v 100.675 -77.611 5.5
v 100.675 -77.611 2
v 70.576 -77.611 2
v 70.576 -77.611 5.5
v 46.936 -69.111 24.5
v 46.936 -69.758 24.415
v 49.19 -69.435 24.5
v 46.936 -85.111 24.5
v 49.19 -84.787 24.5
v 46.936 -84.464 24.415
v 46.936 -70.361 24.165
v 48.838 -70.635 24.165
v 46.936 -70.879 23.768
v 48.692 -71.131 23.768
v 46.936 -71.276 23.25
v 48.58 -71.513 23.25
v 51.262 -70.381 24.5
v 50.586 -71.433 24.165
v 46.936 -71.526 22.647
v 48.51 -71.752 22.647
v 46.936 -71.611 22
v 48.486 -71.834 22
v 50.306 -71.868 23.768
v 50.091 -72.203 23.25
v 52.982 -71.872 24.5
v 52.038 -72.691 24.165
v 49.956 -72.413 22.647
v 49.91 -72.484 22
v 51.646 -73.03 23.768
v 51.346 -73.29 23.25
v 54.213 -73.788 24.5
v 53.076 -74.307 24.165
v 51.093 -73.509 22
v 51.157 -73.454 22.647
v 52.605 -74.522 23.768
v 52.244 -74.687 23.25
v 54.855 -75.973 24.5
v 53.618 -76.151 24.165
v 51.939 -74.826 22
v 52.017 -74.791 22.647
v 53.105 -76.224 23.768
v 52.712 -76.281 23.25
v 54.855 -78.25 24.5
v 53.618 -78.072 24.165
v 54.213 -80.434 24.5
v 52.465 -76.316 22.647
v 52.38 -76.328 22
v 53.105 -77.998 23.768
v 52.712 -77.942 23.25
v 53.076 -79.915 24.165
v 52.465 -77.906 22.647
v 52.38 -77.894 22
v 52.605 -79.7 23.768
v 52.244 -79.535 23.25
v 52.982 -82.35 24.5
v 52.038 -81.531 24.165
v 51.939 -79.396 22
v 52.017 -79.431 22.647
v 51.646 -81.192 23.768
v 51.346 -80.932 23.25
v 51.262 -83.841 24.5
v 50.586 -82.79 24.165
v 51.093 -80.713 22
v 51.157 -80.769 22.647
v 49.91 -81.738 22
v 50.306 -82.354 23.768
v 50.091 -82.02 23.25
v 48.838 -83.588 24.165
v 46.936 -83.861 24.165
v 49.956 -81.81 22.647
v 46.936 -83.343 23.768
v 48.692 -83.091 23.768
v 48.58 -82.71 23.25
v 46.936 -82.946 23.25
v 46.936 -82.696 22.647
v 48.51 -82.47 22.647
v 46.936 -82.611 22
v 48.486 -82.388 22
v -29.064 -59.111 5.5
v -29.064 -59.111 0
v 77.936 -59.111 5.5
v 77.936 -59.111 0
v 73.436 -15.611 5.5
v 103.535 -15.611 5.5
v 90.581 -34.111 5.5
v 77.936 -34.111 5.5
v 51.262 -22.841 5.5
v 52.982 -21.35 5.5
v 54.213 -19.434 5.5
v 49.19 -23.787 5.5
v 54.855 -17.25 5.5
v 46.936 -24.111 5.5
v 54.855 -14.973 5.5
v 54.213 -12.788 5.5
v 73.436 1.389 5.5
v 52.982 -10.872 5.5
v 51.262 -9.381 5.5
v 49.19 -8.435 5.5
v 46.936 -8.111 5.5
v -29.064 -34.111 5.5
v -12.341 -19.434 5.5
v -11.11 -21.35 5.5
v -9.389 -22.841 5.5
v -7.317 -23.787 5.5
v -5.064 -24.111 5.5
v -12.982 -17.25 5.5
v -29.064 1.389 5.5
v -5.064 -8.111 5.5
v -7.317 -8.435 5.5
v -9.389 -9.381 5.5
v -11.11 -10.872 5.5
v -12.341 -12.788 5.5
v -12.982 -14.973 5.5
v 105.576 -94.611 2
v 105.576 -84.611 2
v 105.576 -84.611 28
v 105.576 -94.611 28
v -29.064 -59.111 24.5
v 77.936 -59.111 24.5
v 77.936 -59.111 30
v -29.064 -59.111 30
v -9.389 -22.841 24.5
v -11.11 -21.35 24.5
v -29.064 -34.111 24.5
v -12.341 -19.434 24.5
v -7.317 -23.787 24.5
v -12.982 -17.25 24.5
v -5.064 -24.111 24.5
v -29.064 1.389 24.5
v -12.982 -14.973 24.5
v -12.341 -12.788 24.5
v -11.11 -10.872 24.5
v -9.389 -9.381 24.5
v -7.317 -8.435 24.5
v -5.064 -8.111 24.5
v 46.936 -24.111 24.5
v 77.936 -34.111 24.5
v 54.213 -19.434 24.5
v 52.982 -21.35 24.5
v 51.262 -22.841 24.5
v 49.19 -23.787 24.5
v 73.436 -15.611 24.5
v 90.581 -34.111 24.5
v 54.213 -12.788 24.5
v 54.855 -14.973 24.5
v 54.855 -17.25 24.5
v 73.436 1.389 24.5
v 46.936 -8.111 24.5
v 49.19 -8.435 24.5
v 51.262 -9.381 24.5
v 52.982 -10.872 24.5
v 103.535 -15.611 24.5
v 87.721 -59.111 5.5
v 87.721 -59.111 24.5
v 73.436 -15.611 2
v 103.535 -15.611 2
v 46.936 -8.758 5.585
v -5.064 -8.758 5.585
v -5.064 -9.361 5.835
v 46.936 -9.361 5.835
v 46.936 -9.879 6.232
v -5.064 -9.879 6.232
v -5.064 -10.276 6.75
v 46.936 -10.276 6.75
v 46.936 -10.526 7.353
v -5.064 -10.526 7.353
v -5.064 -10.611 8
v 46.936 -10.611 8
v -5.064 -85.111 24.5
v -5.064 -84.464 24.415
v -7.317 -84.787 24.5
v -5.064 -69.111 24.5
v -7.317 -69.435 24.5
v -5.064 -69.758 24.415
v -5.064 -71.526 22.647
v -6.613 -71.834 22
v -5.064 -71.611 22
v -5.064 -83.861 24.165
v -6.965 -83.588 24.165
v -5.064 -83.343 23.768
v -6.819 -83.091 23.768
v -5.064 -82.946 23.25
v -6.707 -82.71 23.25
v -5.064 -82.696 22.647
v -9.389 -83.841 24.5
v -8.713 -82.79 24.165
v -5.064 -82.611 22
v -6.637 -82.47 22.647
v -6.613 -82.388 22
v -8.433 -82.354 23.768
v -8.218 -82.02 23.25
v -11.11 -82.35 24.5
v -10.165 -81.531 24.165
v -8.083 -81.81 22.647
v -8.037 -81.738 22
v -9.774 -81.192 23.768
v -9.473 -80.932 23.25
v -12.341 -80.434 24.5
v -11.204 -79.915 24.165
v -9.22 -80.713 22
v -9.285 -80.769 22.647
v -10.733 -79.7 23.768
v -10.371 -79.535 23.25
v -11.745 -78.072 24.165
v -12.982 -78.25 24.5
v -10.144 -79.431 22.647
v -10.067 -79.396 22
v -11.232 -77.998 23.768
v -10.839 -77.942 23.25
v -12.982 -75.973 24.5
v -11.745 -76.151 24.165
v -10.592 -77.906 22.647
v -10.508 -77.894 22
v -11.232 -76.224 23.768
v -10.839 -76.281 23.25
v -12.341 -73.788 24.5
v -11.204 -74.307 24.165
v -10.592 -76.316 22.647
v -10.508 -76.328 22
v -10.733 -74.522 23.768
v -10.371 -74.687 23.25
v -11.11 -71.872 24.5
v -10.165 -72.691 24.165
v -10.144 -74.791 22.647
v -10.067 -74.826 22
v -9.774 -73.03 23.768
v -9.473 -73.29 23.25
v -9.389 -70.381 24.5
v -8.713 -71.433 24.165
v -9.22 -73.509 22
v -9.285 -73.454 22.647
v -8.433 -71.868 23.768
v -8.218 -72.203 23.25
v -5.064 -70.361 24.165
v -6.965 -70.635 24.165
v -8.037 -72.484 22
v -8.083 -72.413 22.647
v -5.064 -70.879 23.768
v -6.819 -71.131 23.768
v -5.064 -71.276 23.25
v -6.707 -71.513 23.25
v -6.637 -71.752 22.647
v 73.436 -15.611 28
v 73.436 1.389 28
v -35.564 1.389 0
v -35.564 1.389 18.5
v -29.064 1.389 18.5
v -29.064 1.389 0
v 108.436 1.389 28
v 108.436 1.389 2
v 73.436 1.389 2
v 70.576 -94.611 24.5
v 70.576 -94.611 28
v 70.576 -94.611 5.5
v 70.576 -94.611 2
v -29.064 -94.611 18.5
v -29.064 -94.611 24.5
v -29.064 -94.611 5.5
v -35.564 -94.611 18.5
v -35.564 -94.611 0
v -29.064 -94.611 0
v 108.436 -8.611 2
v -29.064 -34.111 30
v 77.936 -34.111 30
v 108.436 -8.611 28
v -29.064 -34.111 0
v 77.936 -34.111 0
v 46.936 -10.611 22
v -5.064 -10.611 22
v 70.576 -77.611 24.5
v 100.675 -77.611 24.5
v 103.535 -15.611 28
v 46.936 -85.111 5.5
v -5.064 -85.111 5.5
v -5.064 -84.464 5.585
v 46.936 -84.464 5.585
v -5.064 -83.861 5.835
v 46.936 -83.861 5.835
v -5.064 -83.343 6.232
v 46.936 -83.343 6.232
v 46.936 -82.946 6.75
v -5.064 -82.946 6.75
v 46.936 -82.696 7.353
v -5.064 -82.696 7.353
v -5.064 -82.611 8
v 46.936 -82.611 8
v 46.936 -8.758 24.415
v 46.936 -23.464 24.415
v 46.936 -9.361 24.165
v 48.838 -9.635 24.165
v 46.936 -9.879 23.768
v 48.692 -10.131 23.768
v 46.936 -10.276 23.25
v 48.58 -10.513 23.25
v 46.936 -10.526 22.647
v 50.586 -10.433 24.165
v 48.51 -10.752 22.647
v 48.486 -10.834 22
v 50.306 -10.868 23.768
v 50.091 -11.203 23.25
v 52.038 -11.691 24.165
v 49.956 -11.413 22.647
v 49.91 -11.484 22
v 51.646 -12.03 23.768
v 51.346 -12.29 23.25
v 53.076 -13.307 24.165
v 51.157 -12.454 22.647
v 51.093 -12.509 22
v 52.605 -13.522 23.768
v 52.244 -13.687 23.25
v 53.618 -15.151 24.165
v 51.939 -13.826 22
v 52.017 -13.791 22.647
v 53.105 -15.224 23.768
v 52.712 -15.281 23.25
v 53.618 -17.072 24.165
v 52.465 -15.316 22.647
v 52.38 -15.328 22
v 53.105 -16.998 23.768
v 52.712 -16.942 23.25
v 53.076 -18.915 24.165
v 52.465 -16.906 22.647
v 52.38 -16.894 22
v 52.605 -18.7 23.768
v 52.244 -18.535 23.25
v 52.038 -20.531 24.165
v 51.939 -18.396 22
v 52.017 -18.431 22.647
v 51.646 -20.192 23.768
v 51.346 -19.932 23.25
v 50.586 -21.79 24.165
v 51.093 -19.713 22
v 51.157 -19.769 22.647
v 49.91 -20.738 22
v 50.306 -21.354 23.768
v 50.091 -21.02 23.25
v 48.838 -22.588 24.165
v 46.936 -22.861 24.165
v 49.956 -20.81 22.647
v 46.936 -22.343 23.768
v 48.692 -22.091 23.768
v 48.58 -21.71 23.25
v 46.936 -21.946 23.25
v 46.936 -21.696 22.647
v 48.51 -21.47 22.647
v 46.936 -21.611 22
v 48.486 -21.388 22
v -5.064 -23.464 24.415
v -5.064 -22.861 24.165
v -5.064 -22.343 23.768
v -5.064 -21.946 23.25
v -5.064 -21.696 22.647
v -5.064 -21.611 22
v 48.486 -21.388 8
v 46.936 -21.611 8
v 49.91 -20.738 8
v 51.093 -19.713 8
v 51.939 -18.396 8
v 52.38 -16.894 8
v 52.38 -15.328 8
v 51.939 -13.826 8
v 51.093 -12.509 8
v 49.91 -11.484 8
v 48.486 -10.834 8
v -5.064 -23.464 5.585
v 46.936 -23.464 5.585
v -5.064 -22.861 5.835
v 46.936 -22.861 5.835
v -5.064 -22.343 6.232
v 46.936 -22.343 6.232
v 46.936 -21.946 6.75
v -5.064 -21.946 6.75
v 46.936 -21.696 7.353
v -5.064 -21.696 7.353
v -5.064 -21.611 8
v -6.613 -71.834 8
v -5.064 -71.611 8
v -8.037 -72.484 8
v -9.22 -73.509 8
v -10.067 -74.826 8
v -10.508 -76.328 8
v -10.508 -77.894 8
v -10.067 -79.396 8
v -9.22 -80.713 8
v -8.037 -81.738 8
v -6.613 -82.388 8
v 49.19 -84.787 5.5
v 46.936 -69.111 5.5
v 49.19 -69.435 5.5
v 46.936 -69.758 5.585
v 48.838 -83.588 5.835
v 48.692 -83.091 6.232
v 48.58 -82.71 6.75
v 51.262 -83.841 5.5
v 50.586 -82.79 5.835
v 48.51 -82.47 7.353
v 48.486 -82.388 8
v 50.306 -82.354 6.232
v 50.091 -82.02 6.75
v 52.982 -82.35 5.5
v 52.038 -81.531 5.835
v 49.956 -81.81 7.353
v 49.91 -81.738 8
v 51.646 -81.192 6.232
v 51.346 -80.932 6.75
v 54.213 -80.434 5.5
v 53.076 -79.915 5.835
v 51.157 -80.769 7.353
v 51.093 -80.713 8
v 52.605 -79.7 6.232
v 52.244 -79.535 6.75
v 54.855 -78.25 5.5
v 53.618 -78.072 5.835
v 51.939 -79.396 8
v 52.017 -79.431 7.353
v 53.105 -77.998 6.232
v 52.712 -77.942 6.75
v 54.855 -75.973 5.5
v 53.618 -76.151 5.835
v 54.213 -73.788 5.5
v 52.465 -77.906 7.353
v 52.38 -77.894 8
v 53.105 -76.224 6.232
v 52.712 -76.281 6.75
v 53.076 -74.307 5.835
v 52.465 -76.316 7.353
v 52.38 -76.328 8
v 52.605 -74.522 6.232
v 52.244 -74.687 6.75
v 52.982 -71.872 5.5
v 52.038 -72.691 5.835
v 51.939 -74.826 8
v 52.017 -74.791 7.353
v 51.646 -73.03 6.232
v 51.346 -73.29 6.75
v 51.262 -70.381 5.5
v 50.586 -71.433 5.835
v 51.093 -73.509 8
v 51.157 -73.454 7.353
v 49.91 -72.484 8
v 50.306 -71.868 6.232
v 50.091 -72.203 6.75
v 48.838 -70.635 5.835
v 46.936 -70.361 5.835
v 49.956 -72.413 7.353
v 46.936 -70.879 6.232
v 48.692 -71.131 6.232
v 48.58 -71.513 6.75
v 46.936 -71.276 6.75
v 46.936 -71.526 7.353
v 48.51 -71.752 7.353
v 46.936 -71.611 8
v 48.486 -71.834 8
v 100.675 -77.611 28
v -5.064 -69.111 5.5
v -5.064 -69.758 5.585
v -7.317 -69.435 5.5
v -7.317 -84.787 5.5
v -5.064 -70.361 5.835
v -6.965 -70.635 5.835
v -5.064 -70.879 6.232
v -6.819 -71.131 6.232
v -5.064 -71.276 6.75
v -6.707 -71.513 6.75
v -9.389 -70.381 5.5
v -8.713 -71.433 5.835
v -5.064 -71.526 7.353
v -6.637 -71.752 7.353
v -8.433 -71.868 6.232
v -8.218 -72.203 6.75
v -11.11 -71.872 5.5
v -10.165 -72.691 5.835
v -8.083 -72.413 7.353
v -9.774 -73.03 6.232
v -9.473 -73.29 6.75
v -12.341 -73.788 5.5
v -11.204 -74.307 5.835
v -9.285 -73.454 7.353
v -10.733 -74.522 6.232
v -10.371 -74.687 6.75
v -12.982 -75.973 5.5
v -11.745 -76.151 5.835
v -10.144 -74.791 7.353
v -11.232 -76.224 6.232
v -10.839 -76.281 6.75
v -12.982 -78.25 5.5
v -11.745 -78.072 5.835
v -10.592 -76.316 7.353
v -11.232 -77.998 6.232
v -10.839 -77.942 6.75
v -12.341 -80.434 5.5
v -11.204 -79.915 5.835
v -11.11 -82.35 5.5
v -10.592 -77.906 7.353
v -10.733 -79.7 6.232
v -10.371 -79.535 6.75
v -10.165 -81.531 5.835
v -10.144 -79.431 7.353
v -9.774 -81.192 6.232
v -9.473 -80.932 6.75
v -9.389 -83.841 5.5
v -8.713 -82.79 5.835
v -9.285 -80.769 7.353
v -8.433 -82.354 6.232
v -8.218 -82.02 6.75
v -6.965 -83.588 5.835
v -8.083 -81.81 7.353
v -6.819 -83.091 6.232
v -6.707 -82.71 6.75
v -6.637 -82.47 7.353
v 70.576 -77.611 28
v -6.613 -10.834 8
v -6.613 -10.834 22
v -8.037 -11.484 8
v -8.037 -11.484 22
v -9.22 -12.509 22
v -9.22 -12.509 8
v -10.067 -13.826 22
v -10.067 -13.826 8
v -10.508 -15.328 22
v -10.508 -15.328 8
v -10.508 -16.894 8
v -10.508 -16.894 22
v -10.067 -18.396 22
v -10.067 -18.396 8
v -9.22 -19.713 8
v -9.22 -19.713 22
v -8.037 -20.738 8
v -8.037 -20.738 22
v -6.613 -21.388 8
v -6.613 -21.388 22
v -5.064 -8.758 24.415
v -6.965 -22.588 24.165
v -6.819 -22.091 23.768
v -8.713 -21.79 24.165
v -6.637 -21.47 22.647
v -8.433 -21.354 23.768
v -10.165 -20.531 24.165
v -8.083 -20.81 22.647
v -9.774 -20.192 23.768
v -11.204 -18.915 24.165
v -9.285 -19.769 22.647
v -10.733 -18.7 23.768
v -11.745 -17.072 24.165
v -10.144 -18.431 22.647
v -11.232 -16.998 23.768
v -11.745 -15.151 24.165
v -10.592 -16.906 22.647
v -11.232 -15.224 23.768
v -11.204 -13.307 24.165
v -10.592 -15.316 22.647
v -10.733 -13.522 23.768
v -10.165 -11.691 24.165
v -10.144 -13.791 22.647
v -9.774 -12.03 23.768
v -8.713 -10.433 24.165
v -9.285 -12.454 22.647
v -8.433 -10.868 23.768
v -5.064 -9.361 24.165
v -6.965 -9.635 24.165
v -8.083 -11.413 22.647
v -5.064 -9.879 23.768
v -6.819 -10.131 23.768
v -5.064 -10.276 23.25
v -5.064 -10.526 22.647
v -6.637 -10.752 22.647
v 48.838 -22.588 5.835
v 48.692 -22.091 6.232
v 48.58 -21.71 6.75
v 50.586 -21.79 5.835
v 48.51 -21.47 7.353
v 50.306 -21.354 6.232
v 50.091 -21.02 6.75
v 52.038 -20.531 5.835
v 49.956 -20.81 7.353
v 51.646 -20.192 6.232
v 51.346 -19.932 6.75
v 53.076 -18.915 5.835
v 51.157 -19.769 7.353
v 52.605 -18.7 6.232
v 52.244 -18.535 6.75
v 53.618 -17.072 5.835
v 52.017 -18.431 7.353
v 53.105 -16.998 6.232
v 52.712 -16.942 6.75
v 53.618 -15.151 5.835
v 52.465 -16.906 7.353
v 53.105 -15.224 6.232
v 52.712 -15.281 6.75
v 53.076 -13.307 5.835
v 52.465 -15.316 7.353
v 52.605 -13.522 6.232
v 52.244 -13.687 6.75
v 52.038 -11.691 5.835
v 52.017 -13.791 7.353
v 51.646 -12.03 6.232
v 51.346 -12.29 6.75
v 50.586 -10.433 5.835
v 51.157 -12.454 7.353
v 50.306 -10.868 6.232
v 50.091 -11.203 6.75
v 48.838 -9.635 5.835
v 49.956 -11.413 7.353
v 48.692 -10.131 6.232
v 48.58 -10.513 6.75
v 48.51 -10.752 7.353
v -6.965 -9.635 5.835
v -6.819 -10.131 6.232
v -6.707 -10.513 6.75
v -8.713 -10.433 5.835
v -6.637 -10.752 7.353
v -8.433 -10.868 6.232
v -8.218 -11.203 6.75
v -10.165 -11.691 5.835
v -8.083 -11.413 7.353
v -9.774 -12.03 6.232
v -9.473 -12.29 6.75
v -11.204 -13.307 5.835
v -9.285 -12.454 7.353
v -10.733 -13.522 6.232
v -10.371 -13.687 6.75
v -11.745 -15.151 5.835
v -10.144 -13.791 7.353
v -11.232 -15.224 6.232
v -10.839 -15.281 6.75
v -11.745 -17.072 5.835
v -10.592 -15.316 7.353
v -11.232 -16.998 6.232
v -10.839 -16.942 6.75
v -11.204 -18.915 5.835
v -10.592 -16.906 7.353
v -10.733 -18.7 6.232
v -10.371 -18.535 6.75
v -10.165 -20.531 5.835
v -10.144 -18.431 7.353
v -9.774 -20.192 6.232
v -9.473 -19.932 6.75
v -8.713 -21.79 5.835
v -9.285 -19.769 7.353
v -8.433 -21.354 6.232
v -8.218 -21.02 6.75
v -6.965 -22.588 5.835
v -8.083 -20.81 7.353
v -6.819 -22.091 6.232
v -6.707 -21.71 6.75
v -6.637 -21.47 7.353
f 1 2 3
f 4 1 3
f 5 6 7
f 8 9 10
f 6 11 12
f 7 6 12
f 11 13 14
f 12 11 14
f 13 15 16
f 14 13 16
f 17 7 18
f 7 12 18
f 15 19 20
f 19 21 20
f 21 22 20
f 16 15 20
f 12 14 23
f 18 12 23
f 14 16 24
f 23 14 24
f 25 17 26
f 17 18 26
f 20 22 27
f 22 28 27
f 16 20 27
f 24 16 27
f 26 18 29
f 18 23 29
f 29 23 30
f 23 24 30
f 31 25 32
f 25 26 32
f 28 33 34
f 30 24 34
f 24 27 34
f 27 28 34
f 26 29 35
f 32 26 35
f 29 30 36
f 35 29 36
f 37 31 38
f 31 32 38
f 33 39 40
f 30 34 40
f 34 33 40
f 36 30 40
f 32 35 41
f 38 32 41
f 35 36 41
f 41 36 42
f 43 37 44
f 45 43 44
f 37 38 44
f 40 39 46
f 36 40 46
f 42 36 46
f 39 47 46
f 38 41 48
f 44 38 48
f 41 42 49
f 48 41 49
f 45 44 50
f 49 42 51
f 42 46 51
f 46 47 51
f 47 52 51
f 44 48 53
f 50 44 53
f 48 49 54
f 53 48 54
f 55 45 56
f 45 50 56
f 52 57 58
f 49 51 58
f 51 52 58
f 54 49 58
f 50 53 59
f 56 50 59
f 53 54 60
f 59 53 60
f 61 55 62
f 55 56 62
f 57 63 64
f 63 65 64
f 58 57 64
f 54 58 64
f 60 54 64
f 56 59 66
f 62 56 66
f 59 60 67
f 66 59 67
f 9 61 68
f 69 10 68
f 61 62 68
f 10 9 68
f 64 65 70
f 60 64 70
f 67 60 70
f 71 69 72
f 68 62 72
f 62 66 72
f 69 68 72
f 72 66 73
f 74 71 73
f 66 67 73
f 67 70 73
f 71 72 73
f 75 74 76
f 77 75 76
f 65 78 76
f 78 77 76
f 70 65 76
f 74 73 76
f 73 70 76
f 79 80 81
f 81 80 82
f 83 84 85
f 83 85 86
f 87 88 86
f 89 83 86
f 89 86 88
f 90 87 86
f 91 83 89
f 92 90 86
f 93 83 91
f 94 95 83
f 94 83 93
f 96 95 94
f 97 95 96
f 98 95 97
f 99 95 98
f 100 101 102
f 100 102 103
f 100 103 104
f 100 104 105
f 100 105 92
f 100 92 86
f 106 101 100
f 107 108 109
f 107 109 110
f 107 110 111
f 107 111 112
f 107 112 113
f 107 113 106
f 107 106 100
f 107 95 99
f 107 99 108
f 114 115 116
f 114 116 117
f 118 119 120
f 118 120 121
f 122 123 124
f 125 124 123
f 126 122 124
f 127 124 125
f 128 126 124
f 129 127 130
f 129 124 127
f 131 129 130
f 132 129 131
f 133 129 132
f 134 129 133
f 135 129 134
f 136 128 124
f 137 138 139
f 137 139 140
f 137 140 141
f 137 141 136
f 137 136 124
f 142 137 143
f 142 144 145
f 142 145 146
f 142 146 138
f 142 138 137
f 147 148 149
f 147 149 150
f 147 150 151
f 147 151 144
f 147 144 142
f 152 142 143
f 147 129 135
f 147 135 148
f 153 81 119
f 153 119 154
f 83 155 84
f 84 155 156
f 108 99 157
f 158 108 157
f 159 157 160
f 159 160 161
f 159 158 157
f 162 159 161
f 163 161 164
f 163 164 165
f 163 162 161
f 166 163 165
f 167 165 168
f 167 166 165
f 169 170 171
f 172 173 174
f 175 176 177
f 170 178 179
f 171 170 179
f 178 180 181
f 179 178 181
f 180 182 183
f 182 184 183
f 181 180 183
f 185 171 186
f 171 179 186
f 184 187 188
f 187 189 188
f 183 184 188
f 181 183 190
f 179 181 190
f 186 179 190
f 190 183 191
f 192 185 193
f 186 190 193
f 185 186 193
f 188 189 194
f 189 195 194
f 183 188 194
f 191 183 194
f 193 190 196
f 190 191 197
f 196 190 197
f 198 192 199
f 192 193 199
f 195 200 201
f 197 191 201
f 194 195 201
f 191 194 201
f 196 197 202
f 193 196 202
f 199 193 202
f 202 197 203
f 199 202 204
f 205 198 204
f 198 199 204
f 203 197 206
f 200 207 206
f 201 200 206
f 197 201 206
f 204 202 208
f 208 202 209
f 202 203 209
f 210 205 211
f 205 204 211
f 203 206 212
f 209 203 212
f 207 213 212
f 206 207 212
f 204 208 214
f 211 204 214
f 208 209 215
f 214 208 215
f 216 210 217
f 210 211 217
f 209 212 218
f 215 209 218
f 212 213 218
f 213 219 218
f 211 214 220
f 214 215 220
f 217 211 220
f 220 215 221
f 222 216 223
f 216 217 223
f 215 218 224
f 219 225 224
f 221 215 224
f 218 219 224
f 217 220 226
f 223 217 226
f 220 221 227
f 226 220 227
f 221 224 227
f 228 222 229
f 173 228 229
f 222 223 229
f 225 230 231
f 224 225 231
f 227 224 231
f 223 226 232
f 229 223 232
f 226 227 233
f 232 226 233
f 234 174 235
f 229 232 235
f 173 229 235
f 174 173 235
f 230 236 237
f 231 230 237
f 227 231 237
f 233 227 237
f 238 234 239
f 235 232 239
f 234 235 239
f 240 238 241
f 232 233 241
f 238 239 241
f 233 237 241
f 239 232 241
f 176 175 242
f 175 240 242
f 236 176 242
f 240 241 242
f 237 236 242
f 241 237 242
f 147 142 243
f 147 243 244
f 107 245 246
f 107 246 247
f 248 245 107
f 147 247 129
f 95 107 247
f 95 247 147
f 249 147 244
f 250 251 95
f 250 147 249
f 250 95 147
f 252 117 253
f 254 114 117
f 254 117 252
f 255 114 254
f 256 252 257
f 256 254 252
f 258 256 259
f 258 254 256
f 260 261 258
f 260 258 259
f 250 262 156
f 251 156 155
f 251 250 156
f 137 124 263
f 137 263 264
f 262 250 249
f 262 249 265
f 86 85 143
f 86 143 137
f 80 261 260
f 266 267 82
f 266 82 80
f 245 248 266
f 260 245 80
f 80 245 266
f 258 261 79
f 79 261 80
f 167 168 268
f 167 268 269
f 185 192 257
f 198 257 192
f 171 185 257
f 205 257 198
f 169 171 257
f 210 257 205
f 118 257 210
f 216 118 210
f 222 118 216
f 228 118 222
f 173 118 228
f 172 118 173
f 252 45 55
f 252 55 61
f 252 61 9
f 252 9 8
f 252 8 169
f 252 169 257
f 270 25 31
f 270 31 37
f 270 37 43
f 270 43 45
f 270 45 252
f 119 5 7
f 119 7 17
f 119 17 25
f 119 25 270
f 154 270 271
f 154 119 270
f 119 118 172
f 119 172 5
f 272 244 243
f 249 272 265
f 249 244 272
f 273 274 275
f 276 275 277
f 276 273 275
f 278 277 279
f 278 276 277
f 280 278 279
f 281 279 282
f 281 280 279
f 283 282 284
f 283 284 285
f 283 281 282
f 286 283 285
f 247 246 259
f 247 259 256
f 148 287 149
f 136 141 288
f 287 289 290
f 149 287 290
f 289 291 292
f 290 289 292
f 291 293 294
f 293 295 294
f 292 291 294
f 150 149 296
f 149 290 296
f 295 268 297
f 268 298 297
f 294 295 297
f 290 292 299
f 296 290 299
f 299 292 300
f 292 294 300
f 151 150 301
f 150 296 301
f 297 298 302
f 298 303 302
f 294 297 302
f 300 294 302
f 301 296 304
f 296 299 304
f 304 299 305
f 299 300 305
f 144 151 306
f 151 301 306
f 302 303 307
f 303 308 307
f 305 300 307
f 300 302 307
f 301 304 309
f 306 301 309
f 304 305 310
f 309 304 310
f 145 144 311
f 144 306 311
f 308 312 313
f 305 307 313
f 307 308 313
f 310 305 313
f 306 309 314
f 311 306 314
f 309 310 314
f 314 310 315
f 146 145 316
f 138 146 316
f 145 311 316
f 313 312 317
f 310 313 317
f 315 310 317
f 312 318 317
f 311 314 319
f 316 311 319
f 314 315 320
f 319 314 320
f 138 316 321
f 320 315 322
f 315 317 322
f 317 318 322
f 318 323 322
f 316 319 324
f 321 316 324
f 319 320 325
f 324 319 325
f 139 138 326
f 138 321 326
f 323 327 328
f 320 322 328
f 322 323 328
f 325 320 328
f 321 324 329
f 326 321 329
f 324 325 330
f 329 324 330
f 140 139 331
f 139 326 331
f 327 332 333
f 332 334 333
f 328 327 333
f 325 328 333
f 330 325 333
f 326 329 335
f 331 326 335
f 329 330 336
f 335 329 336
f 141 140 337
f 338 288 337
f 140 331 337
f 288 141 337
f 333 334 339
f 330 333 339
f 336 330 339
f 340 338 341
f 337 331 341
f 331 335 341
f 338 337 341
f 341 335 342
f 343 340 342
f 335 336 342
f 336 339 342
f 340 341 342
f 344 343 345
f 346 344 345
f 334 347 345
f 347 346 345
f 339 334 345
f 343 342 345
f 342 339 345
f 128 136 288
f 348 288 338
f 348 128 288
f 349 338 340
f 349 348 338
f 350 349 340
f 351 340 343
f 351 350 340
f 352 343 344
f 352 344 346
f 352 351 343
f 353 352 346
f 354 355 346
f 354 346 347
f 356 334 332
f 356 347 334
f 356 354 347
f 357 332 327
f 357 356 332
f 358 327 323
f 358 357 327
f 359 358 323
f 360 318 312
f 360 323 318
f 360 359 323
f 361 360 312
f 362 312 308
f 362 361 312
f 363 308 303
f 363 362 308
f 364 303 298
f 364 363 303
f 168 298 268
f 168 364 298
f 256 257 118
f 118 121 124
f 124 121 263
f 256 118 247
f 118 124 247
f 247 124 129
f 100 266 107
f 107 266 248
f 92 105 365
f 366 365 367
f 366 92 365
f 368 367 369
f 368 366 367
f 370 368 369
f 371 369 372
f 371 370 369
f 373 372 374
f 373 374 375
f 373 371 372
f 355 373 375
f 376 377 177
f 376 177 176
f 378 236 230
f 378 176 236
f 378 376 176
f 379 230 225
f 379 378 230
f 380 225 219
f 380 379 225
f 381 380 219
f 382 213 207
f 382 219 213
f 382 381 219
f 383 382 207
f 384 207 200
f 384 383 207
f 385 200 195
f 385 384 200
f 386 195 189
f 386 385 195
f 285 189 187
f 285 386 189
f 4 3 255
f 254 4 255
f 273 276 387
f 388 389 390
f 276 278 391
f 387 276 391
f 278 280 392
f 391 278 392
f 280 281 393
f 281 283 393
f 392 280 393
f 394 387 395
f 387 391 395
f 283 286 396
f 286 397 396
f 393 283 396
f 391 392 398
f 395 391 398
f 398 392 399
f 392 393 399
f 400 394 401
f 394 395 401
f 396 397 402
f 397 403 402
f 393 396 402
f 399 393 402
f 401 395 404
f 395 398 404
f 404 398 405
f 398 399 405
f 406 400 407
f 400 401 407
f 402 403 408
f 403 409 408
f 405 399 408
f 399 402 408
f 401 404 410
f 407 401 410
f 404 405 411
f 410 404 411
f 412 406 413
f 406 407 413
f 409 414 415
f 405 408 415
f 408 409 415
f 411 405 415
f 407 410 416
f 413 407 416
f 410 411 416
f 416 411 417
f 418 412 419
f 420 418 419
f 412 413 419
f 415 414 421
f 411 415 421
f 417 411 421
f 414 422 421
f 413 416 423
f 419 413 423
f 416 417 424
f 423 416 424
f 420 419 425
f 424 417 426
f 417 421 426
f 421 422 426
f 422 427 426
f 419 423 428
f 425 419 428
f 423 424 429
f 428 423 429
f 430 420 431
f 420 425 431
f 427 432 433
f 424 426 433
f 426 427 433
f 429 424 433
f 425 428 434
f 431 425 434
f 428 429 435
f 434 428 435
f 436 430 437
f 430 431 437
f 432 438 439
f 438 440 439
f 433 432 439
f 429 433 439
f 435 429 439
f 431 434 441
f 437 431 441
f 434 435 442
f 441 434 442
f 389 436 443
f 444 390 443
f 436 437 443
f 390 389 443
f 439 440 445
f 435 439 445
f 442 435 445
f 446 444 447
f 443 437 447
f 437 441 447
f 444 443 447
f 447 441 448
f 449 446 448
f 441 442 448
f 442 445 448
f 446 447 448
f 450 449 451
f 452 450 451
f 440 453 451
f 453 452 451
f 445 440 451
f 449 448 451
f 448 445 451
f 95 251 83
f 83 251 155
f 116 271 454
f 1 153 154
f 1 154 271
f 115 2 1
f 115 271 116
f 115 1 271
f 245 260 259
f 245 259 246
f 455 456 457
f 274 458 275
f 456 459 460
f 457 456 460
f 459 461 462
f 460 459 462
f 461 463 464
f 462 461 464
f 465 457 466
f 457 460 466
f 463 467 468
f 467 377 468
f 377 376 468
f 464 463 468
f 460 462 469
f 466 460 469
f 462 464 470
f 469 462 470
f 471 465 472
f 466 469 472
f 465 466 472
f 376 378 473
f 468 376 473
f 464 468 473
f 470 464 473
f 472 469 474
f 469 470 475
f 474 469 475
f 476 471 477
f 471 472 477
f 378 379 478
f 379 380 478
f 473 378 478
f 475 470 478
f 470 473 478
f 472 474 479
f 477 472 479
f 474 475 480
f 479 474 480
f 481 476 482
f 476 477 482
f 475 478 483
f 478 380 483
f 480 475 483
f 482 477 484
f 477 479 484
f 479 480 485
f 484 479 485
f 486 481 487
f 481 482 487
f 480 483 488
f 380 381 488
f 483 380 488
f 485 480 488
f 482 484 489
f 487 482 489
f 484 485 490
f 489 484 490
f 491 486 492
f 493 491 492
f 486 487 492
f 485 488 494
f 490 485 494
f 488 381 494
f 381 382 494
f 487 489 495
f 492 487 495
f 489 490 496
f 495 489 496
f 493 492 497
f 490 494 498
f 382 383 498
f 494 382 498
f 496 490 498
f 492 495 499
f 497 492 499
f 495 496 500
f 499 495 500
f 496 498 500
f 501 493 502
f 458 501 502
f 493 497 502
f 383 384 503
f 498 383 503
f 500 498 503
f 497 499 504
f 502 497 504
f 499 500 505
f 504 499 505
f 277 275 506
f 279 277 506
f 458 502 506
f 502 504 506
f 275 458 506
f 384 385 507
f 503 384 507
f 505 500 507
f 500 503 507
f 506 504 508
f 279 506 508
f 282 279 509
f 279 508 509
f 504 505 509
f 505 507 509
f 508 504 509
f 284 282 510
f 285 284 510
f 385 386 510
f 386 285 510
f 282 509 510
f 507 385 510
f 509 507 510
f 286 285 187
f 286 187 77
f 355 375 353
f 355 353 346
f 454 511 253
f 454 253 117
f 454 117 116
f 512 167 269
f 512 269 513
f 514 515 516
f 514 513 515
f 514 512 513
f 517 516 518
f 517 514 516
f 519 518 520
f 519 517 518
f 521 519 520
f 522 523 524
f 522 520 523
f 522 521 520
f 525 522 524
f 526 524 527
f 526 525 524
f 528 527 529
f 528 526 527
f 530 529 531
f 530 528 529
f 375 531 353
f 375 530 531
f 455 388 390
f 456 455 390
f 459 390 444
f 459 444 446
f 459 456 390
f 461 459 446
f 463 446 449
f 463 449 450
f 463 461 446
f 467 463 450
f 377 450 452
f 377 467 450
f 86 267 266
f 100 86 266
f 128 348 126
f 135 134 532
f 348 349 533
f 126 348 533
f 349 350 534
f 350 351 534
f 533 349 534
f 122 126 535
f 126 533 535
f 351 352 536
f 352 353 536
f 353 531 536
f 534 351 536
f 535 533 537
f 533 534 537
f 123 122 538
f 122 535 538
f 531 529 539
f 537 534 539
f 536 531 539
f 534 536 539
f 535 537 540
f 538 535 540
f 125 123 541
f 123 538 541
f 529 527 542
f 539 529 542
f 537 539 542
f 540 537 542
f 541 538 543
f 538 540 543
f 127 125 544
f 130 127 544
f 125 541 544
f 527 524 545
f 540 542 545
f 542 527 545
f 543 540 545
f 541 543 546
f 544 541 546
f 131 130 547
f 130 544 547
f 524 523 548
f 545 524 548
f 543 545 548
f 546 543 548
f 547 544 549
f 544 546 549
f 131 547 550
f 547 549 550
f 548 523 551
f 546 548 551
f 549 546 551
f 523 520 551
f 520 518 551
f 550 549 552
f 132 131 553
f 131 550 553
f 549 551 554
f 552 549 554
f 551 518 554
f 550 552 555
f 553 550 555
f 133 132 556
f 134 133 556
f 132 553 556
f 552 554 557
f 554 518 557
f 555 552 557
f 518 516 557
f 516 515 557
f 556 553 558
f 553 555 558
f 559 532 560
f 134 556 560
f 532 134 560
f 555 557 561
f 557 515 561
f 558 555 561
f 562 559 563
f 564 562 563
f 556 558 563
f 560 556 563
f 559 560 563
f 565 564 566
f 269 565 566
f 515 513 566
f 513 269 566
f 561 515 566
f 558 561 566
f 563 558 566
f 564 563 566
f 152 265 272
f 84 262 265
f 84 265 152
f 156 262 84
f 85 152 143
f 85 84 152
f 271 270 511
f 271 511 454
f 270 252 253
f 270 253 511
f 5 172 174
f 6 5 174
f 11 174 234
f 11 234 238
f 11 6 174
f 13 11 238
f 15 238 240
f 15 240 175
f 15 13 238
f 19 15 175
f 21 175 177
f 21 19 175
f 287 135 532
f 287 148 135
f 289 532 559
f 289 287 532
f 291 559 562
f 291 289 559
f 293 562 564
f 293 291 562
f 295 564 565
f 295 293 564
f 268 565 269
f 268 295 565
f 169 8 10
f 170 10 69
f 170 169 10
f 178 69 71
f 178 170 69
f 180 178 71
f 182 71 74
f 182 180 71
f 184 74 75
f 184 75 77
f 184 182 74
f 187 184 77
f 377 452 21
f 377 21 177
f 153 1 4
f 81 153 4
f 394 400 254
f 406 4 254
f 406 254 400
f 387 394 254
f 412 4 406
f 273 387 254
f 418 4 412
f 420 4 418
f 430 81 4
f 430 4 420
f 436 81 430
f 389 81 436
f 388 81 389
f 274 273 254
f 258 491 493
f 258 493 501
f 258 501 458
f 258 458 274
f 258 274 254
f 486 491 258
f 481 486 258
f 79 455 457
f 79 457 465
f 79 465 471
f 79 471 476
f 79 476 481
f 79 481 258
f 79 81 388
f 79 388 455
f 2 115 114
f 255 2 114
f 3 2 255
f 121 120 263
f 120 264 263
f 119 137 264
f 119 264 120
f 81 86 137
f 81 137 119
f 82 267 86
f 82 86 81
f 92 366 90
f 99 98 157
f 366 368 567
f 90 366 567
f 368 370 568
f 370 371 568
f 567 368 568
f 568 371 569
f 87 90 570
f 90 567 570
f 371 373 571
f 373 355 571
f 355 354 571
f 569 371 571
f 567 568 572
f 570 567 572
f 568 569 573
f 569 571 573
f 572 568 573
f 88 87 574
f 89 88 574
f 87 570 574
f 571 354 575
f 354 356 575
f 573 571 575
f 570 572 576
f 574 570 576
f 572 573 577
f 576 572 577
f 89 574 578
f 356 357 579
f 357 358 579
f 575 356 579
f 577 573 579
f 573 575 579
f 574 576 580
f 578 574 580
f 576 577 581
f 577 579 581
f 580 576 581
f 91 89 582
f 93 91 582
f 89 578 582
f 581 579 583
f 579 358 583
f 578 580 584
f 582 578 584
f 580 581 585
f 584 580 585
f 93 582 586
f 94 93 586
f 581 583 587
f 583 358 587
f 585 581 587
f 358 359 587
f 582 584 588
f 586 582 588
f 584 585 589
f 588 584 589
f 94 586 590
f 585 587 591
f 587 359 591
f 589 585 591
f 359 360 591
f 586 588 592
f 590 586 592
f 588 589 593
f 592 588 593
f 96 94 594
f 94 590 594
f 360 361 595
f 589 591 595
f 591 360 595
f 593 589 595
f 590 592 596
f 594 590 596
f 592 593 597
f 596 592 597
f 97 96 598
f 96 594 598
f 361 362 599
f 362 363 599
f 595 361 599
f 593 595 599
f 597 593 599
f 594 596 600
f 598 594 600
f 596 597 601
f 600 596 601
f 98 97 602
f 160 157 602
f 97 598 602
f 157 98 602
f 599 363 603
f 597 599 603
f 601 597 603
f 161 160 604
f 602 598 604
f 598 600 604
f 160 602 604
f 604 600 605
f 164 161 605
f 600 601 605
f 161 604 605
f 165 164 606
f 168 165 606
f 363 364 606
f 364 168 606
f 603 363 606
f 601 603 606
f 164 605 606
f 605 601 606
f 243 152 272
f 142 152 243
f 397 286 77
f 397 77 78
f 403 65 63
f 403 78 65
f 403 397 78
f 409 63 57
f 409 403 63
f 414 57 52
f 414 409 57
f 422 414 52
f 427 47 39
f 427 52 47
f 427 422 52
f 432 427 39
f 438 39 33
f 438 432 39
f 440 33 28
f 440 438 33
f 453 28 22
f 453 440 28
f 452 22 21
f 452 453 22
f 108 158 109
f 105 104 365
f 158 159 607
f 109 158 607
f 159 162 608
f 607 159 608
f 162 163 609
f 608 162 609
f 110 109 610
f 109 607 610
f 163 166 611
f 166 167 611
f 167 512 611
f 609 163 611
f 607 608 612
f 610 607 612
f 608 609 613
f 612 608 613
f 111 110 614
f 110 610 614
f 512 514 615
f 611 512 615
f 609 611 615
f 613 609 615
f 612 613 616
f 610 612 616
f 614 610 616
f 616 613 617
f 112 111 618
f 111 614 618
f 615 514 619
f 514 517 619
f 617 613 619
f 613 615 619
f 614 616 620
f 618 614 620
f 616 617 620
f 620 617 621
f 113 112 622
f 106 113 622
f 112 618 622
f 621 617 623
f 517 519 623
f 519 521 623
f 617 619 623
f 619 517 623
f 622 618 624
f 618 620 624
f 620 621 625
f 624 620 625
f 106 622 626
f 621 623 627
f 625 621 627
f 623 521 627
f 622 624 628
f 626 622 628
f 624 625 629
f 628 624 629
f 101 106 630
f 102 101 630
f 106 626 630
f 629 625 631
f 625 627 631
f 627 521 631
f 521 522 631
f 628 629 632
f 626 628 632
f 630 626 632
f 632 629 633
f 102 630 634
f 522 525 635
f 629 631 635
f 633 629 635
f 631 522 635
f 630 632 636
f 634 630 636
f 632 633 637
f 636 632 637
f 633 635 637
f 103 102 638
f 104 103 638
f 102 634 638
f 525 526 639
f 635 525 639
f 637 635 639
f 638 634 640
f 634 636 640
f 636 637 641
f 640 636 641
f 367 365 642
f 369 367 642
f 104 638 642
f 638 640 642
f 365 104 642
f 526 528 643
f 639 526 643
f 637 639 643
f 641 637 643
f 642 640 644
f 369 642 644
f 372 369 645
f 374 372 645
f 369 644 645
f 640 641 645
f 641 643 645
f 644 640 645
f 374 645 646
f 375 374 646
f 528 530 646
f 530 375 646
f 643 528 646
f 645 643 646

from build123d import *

# Parameters (mm, degrees)
BOSS_EXTRU_1_DEPTH      = 30
ESQUISSE3_W             = 6.5
ESQUISSE3_H             = 96
ENL_V_MAT_EXTRU_1_DEPTH = 11.5
ENL_V_START             = -5.5
ENL_V_MAT_EXTRU_2_DEPTH = 5.5
ENL_V_MAT_EXTRU_3_DEPTH = 5.5
ENL_V_MAT_EXTRU_4_DEPTH = 2
ENL_V_MAT_EXTRU_5_DEPTH = 2
CONG_2_R                = 2.5
CONG_3_R                = 2.5
CONG_4_R                = 2.5
CONG_5_R                = 2.5


with BuildPart() as part:
    # Esquisse1 → Boss.-Extru.1 (new body)
    with BuildSketch(Plane.XY):
        Polygon((-35.56359131, -94.611176471), (-35.56359131, 1.388823529), (108.43640869, 1.388823529), (108.43640869, -8.611176471), (90.581116466, -34.111176471), (77.93640869, -34.111176471), (77.93640869, -59.111176471), (87.721135464, -59.111176471), (105.576427689, -84.611176471), (105.576427689, -94.611176471), align=None)
        with BuildLine():
            Line((-5.06359131, -21.611176471), (46.93640869, -21.611176471))
            ThreePointArc((46.93640869, -21.611176471), (52.43640869, -16.111176471), (46.93640869, -10.611176471))
            Line((46.93640869, -10.611176471), (-5.06359131, -10.611176471))
            ThreePointArc((-5.06359131, -10.611176471), (-10.56359131, -16.111176471), (-5.06359131, -21.611176471))
        make_face(mode=Mode.SUBTRACT)
        with BuildLine():
            Line((-5.06359131, -82.611176471), (46.93640869, -82.611176471))
            ThreePointArc((46.93640869, -82.611176471), (52.43640869, -77.111176471), (46.93640869, -71.611176471))
            Line((46.93640869, -71.611176471), (-5.06359131, -71.611176471))
            ThreePointArc((-5.06359131, -71.611176471), (-10.56359131, -77.111176471), (-5.06359131, -82.611176471))
        make_face(mode=Mode.SUBTRACT)
    extrude(amount=BOSS_EXTRU_1_DEPTH)

    # Esquisse3 → Enlèv. mat.-Extru.1 (cut)
    with BuildSketch(Plane.XY.offset(30)):
        with Locations((-32.31359131, -46.611176471)):
            Rectangle(ESQUISSE3_W, ESQUISSE3_H)
    extrude(amount=-ENL_V_MAT_EXTRU_1_DEPTH, mode=Mode.SUBTRACT)

    # Esquisse4 → Enlèv. mat.-Extru.2 (cut)
    # profile 1 of 2: a face of its own
    with BuildSketch(Plane.XY.offset(30).offset(ENL_V_START)):
        Polygon((-29.06359131, 1.388823529), (-29.06359131, -34.111176471), (77.93640869, -34.111176471), (90.581116466, -34.111176471), (103.534955923, -15.611176471), (73.43640869, -15.611176471), (73.43640869, 1.388823529), align=None)
        with BuildLine():
            ThreePointArc((46.93640869, -10.611176471), (52.43640869, -16.111176471), (46.93640869, -21.611176471))
            Line((46.93640869, -21.611176471), (-5.06359131, -21.611176471))
            ThreePointArc((-5.06359131, -21.611176471), (-10.56359131, -16.111176471), (-5.06359131, -10.611176471))
            Line((-5.06359131, -10.611176471), (46.93640869, -10.611176471))
        make_face(mode=Mode.SUBTRACT)
    # profile 2 of 2: a face of its own
    with BuildSketch(Plane.XY.offset(30).offset(ENL_V_START)):
        Polygon((-29.06359131, -94.611176471), (70.576427689, -94.611176471), (70.576427689, -77.611176471), (100.674974921, -77.611176471), (87.721135464, -59.111176471), (77.93640869, -59.111176471), (-29.06359131, -59.111176471), align=None)
        with BuildLine():
            ThreePointArc((46.93640869, -71.611176471), (52.43640869, -77.111176471), (46.93640869, -82.611176471))
            Line((46.93640869, -82.611176471), (-5.06359131, -82.611176471))
            ThreePointArc((-5.06359131, -82.611176471), (-10.56359131, -77.111176471), (-5.06359131, -71.611176471))
            Line((-5.06359131, -71.611176471), (46.93640869, -71.611176471))
        make_face(mode=Mode.SUBTRACT)
    extrude(amount=ENL_V_MAT_EXTRU_2_DEPTH, mode=Mode.SUBTRACT)

    # Esquisse5 → Enlèv. mat.-Extru.3 (cut)
    # profile 1 of 2: a face of its own
    with BuildSketch(Plane(origin=(0, 0, 0), x_dir=(-1, 0, 0), z_dir=(0, 0, -1))):
        Polygon((-73.43640869, -15.611176471), (-103.534955923, -15.611176471), (-90.581116466, -34.111176471), (-77.93640869, -34.111176471), (29.06359131, -34.111176471), (29.06359131, 1.388823529), (-73.43640869, 1.388823529), align=None)
        with BuildLine():
            ThreePointArc((5.06359131, -10.611176471), (10.56359131, -16.111176471), (5.06359131, -21.611176471))
            Line((5.06359131, -21.611176471), (-46.93640869, -21.611176471))
            ThreePointArc((-46.93640869, -21.611176471), (-52.43640869, -16.111176471), (-46.93640869, -10.611176471))
            Line((-46.93640869, -10.611176471), (5.06359131, -10.611176471))
        make_face(mode=Mode.SUBTRACT)
    # profile 2 of 2: a face of its own
    with BuildSketch(Plane(origin=(0, 0, 0), x_dir=(-1, 0, 0), z_dir=(0, 0, -1))):
        Polygon((-77.93640869, -59.111176471), (-87.721135464, -59.111176471), (-100.674974921, -77.611176471), (-70.576427689, -77.611176471), (-70.576427689, -94.611176471), (29.06359131, -94.611176471), (29.06359131, -59.111176471), align=None)
        with BuildLine():
            ThreePointArc((5.06359131, -71.611176471), (10.56359131, -77.111176471), (5.06359131, -82.611176471))
            Line((5.06359131, -82.611176471), (-46.93640869, -82.611176471))
            ThreePointArc((-46.93640869, -82.611176471), (-52.43640869, -77.111176471), (-46.93640869, -71.611176471))
            Line((-46.93640869, -71.611176471), (5.06359131, -71.611176471))
        make_face(mode=Mode.SUBTRACT)
    extrude(amount=-ENL_V_MAT_EXTRU_3_DEPTH, mode=Mode.SUBTRACT)

    # Esquisse6 → Enlèv. mat.-Extru.4 (cut)
    with BuildSketch(Plane(origin=(0, 0, 0), x_dir=(-1, 0, 0), z_dir=(0, 0, -1))):
        Polygon((-103.534955923, -15.611176471), (-73.43640869, -15.611176471), (-73.43640869, 1.388823529), (-108.43640869, 1.388823529), (-108.43640869, -8.611176471), align=None)
        Polygon((-70.576427689, -77.611176471), (-100.674974921, -77.611176471), (-105.576427689, -84.611176471), (-105.576427689, -94.611176471), (-70.576427689, -94.611176471), align=None)
    extrude(amount=-ENL_V_MAT_EXTRU_4_DEPTH, mode=Mode.SUBTRACT)

    # Esquisse7 → Enlèv. mat.-Extru.5 (cut)
    with BuildSketch(Plane.XY.offset(30)):
        Polygon((73.43640869, -15.611176471), (103.534955923, -15.611176471), (108.43640869, -8.611176471), (108.43640869, 1.388823529), (73.43640869, 1.388823529), align=None)
        Polygon((100.674974921, -77.611176471), (70.576427689, -77.611176471), (70.576427689, -94.611176471), (105.576427689, -94.611176471), (105.576427689, -84.611176471), align=None)
    extrude(amount=-ENL_V_MAT_EXTRU_5_DEPTH, mode=Mode.SUBTRACT)

    # Congé2
    cong_2_edges = [part.edges().sort_by_distance(p)[0] for p in [
        (20.93640869, -10.611176471, 24.5),
        (-10.56359131, -16.111176471, 24.5),
        (20.93640869, -21.611176471, 24.5),
        (52.43640869, -16.111176471, 24.5),
    ]]
    fillet(cong_2_edges, radius=CONG_2_R)

    # Congé3
    cong_3_edges = [part.edges().sort_by_distance(p)[0] for p in [
        (52.43640869, -77.111176471, 24.5),
        (20.93640869, -71.611176471, 24.5),
        (-10.56359131, -77.111176471, 24.5),
        (20.93640869, -82.611176471, 24.5),
    ]]
    fillet(cong_3_edges, radius=CONG_3_R)

    # Congé4
    cong_4_edges = [part.edges().sort_by_distance(p)[0] for p in [
        (-10.56359131, -16.111176471, 5.5),
        (20.93640869, -10.611176471, 5.5),
        (52.43640869, -16.111176471, 5.5),
        (20.93640869, -21.611176471, 5.5),
    ]]
    fillet(cong_4_edges, radius=CONG_4_R)

    # Congé5
    cong_5_edges = [part.edges().sort_by_distance(p)[0] for p in [
        (-10.56359131, -77.111176471, 5.5),
        (20.93640869, -71.611176471, 5.5),
        (52.43640869, -77.111176471, 5.5),
        (20.93640869, -82.611176471, 5.5),
    ]]
    fillet(cong_5_edges, radius=CONG_5_R)


solid = part.part
